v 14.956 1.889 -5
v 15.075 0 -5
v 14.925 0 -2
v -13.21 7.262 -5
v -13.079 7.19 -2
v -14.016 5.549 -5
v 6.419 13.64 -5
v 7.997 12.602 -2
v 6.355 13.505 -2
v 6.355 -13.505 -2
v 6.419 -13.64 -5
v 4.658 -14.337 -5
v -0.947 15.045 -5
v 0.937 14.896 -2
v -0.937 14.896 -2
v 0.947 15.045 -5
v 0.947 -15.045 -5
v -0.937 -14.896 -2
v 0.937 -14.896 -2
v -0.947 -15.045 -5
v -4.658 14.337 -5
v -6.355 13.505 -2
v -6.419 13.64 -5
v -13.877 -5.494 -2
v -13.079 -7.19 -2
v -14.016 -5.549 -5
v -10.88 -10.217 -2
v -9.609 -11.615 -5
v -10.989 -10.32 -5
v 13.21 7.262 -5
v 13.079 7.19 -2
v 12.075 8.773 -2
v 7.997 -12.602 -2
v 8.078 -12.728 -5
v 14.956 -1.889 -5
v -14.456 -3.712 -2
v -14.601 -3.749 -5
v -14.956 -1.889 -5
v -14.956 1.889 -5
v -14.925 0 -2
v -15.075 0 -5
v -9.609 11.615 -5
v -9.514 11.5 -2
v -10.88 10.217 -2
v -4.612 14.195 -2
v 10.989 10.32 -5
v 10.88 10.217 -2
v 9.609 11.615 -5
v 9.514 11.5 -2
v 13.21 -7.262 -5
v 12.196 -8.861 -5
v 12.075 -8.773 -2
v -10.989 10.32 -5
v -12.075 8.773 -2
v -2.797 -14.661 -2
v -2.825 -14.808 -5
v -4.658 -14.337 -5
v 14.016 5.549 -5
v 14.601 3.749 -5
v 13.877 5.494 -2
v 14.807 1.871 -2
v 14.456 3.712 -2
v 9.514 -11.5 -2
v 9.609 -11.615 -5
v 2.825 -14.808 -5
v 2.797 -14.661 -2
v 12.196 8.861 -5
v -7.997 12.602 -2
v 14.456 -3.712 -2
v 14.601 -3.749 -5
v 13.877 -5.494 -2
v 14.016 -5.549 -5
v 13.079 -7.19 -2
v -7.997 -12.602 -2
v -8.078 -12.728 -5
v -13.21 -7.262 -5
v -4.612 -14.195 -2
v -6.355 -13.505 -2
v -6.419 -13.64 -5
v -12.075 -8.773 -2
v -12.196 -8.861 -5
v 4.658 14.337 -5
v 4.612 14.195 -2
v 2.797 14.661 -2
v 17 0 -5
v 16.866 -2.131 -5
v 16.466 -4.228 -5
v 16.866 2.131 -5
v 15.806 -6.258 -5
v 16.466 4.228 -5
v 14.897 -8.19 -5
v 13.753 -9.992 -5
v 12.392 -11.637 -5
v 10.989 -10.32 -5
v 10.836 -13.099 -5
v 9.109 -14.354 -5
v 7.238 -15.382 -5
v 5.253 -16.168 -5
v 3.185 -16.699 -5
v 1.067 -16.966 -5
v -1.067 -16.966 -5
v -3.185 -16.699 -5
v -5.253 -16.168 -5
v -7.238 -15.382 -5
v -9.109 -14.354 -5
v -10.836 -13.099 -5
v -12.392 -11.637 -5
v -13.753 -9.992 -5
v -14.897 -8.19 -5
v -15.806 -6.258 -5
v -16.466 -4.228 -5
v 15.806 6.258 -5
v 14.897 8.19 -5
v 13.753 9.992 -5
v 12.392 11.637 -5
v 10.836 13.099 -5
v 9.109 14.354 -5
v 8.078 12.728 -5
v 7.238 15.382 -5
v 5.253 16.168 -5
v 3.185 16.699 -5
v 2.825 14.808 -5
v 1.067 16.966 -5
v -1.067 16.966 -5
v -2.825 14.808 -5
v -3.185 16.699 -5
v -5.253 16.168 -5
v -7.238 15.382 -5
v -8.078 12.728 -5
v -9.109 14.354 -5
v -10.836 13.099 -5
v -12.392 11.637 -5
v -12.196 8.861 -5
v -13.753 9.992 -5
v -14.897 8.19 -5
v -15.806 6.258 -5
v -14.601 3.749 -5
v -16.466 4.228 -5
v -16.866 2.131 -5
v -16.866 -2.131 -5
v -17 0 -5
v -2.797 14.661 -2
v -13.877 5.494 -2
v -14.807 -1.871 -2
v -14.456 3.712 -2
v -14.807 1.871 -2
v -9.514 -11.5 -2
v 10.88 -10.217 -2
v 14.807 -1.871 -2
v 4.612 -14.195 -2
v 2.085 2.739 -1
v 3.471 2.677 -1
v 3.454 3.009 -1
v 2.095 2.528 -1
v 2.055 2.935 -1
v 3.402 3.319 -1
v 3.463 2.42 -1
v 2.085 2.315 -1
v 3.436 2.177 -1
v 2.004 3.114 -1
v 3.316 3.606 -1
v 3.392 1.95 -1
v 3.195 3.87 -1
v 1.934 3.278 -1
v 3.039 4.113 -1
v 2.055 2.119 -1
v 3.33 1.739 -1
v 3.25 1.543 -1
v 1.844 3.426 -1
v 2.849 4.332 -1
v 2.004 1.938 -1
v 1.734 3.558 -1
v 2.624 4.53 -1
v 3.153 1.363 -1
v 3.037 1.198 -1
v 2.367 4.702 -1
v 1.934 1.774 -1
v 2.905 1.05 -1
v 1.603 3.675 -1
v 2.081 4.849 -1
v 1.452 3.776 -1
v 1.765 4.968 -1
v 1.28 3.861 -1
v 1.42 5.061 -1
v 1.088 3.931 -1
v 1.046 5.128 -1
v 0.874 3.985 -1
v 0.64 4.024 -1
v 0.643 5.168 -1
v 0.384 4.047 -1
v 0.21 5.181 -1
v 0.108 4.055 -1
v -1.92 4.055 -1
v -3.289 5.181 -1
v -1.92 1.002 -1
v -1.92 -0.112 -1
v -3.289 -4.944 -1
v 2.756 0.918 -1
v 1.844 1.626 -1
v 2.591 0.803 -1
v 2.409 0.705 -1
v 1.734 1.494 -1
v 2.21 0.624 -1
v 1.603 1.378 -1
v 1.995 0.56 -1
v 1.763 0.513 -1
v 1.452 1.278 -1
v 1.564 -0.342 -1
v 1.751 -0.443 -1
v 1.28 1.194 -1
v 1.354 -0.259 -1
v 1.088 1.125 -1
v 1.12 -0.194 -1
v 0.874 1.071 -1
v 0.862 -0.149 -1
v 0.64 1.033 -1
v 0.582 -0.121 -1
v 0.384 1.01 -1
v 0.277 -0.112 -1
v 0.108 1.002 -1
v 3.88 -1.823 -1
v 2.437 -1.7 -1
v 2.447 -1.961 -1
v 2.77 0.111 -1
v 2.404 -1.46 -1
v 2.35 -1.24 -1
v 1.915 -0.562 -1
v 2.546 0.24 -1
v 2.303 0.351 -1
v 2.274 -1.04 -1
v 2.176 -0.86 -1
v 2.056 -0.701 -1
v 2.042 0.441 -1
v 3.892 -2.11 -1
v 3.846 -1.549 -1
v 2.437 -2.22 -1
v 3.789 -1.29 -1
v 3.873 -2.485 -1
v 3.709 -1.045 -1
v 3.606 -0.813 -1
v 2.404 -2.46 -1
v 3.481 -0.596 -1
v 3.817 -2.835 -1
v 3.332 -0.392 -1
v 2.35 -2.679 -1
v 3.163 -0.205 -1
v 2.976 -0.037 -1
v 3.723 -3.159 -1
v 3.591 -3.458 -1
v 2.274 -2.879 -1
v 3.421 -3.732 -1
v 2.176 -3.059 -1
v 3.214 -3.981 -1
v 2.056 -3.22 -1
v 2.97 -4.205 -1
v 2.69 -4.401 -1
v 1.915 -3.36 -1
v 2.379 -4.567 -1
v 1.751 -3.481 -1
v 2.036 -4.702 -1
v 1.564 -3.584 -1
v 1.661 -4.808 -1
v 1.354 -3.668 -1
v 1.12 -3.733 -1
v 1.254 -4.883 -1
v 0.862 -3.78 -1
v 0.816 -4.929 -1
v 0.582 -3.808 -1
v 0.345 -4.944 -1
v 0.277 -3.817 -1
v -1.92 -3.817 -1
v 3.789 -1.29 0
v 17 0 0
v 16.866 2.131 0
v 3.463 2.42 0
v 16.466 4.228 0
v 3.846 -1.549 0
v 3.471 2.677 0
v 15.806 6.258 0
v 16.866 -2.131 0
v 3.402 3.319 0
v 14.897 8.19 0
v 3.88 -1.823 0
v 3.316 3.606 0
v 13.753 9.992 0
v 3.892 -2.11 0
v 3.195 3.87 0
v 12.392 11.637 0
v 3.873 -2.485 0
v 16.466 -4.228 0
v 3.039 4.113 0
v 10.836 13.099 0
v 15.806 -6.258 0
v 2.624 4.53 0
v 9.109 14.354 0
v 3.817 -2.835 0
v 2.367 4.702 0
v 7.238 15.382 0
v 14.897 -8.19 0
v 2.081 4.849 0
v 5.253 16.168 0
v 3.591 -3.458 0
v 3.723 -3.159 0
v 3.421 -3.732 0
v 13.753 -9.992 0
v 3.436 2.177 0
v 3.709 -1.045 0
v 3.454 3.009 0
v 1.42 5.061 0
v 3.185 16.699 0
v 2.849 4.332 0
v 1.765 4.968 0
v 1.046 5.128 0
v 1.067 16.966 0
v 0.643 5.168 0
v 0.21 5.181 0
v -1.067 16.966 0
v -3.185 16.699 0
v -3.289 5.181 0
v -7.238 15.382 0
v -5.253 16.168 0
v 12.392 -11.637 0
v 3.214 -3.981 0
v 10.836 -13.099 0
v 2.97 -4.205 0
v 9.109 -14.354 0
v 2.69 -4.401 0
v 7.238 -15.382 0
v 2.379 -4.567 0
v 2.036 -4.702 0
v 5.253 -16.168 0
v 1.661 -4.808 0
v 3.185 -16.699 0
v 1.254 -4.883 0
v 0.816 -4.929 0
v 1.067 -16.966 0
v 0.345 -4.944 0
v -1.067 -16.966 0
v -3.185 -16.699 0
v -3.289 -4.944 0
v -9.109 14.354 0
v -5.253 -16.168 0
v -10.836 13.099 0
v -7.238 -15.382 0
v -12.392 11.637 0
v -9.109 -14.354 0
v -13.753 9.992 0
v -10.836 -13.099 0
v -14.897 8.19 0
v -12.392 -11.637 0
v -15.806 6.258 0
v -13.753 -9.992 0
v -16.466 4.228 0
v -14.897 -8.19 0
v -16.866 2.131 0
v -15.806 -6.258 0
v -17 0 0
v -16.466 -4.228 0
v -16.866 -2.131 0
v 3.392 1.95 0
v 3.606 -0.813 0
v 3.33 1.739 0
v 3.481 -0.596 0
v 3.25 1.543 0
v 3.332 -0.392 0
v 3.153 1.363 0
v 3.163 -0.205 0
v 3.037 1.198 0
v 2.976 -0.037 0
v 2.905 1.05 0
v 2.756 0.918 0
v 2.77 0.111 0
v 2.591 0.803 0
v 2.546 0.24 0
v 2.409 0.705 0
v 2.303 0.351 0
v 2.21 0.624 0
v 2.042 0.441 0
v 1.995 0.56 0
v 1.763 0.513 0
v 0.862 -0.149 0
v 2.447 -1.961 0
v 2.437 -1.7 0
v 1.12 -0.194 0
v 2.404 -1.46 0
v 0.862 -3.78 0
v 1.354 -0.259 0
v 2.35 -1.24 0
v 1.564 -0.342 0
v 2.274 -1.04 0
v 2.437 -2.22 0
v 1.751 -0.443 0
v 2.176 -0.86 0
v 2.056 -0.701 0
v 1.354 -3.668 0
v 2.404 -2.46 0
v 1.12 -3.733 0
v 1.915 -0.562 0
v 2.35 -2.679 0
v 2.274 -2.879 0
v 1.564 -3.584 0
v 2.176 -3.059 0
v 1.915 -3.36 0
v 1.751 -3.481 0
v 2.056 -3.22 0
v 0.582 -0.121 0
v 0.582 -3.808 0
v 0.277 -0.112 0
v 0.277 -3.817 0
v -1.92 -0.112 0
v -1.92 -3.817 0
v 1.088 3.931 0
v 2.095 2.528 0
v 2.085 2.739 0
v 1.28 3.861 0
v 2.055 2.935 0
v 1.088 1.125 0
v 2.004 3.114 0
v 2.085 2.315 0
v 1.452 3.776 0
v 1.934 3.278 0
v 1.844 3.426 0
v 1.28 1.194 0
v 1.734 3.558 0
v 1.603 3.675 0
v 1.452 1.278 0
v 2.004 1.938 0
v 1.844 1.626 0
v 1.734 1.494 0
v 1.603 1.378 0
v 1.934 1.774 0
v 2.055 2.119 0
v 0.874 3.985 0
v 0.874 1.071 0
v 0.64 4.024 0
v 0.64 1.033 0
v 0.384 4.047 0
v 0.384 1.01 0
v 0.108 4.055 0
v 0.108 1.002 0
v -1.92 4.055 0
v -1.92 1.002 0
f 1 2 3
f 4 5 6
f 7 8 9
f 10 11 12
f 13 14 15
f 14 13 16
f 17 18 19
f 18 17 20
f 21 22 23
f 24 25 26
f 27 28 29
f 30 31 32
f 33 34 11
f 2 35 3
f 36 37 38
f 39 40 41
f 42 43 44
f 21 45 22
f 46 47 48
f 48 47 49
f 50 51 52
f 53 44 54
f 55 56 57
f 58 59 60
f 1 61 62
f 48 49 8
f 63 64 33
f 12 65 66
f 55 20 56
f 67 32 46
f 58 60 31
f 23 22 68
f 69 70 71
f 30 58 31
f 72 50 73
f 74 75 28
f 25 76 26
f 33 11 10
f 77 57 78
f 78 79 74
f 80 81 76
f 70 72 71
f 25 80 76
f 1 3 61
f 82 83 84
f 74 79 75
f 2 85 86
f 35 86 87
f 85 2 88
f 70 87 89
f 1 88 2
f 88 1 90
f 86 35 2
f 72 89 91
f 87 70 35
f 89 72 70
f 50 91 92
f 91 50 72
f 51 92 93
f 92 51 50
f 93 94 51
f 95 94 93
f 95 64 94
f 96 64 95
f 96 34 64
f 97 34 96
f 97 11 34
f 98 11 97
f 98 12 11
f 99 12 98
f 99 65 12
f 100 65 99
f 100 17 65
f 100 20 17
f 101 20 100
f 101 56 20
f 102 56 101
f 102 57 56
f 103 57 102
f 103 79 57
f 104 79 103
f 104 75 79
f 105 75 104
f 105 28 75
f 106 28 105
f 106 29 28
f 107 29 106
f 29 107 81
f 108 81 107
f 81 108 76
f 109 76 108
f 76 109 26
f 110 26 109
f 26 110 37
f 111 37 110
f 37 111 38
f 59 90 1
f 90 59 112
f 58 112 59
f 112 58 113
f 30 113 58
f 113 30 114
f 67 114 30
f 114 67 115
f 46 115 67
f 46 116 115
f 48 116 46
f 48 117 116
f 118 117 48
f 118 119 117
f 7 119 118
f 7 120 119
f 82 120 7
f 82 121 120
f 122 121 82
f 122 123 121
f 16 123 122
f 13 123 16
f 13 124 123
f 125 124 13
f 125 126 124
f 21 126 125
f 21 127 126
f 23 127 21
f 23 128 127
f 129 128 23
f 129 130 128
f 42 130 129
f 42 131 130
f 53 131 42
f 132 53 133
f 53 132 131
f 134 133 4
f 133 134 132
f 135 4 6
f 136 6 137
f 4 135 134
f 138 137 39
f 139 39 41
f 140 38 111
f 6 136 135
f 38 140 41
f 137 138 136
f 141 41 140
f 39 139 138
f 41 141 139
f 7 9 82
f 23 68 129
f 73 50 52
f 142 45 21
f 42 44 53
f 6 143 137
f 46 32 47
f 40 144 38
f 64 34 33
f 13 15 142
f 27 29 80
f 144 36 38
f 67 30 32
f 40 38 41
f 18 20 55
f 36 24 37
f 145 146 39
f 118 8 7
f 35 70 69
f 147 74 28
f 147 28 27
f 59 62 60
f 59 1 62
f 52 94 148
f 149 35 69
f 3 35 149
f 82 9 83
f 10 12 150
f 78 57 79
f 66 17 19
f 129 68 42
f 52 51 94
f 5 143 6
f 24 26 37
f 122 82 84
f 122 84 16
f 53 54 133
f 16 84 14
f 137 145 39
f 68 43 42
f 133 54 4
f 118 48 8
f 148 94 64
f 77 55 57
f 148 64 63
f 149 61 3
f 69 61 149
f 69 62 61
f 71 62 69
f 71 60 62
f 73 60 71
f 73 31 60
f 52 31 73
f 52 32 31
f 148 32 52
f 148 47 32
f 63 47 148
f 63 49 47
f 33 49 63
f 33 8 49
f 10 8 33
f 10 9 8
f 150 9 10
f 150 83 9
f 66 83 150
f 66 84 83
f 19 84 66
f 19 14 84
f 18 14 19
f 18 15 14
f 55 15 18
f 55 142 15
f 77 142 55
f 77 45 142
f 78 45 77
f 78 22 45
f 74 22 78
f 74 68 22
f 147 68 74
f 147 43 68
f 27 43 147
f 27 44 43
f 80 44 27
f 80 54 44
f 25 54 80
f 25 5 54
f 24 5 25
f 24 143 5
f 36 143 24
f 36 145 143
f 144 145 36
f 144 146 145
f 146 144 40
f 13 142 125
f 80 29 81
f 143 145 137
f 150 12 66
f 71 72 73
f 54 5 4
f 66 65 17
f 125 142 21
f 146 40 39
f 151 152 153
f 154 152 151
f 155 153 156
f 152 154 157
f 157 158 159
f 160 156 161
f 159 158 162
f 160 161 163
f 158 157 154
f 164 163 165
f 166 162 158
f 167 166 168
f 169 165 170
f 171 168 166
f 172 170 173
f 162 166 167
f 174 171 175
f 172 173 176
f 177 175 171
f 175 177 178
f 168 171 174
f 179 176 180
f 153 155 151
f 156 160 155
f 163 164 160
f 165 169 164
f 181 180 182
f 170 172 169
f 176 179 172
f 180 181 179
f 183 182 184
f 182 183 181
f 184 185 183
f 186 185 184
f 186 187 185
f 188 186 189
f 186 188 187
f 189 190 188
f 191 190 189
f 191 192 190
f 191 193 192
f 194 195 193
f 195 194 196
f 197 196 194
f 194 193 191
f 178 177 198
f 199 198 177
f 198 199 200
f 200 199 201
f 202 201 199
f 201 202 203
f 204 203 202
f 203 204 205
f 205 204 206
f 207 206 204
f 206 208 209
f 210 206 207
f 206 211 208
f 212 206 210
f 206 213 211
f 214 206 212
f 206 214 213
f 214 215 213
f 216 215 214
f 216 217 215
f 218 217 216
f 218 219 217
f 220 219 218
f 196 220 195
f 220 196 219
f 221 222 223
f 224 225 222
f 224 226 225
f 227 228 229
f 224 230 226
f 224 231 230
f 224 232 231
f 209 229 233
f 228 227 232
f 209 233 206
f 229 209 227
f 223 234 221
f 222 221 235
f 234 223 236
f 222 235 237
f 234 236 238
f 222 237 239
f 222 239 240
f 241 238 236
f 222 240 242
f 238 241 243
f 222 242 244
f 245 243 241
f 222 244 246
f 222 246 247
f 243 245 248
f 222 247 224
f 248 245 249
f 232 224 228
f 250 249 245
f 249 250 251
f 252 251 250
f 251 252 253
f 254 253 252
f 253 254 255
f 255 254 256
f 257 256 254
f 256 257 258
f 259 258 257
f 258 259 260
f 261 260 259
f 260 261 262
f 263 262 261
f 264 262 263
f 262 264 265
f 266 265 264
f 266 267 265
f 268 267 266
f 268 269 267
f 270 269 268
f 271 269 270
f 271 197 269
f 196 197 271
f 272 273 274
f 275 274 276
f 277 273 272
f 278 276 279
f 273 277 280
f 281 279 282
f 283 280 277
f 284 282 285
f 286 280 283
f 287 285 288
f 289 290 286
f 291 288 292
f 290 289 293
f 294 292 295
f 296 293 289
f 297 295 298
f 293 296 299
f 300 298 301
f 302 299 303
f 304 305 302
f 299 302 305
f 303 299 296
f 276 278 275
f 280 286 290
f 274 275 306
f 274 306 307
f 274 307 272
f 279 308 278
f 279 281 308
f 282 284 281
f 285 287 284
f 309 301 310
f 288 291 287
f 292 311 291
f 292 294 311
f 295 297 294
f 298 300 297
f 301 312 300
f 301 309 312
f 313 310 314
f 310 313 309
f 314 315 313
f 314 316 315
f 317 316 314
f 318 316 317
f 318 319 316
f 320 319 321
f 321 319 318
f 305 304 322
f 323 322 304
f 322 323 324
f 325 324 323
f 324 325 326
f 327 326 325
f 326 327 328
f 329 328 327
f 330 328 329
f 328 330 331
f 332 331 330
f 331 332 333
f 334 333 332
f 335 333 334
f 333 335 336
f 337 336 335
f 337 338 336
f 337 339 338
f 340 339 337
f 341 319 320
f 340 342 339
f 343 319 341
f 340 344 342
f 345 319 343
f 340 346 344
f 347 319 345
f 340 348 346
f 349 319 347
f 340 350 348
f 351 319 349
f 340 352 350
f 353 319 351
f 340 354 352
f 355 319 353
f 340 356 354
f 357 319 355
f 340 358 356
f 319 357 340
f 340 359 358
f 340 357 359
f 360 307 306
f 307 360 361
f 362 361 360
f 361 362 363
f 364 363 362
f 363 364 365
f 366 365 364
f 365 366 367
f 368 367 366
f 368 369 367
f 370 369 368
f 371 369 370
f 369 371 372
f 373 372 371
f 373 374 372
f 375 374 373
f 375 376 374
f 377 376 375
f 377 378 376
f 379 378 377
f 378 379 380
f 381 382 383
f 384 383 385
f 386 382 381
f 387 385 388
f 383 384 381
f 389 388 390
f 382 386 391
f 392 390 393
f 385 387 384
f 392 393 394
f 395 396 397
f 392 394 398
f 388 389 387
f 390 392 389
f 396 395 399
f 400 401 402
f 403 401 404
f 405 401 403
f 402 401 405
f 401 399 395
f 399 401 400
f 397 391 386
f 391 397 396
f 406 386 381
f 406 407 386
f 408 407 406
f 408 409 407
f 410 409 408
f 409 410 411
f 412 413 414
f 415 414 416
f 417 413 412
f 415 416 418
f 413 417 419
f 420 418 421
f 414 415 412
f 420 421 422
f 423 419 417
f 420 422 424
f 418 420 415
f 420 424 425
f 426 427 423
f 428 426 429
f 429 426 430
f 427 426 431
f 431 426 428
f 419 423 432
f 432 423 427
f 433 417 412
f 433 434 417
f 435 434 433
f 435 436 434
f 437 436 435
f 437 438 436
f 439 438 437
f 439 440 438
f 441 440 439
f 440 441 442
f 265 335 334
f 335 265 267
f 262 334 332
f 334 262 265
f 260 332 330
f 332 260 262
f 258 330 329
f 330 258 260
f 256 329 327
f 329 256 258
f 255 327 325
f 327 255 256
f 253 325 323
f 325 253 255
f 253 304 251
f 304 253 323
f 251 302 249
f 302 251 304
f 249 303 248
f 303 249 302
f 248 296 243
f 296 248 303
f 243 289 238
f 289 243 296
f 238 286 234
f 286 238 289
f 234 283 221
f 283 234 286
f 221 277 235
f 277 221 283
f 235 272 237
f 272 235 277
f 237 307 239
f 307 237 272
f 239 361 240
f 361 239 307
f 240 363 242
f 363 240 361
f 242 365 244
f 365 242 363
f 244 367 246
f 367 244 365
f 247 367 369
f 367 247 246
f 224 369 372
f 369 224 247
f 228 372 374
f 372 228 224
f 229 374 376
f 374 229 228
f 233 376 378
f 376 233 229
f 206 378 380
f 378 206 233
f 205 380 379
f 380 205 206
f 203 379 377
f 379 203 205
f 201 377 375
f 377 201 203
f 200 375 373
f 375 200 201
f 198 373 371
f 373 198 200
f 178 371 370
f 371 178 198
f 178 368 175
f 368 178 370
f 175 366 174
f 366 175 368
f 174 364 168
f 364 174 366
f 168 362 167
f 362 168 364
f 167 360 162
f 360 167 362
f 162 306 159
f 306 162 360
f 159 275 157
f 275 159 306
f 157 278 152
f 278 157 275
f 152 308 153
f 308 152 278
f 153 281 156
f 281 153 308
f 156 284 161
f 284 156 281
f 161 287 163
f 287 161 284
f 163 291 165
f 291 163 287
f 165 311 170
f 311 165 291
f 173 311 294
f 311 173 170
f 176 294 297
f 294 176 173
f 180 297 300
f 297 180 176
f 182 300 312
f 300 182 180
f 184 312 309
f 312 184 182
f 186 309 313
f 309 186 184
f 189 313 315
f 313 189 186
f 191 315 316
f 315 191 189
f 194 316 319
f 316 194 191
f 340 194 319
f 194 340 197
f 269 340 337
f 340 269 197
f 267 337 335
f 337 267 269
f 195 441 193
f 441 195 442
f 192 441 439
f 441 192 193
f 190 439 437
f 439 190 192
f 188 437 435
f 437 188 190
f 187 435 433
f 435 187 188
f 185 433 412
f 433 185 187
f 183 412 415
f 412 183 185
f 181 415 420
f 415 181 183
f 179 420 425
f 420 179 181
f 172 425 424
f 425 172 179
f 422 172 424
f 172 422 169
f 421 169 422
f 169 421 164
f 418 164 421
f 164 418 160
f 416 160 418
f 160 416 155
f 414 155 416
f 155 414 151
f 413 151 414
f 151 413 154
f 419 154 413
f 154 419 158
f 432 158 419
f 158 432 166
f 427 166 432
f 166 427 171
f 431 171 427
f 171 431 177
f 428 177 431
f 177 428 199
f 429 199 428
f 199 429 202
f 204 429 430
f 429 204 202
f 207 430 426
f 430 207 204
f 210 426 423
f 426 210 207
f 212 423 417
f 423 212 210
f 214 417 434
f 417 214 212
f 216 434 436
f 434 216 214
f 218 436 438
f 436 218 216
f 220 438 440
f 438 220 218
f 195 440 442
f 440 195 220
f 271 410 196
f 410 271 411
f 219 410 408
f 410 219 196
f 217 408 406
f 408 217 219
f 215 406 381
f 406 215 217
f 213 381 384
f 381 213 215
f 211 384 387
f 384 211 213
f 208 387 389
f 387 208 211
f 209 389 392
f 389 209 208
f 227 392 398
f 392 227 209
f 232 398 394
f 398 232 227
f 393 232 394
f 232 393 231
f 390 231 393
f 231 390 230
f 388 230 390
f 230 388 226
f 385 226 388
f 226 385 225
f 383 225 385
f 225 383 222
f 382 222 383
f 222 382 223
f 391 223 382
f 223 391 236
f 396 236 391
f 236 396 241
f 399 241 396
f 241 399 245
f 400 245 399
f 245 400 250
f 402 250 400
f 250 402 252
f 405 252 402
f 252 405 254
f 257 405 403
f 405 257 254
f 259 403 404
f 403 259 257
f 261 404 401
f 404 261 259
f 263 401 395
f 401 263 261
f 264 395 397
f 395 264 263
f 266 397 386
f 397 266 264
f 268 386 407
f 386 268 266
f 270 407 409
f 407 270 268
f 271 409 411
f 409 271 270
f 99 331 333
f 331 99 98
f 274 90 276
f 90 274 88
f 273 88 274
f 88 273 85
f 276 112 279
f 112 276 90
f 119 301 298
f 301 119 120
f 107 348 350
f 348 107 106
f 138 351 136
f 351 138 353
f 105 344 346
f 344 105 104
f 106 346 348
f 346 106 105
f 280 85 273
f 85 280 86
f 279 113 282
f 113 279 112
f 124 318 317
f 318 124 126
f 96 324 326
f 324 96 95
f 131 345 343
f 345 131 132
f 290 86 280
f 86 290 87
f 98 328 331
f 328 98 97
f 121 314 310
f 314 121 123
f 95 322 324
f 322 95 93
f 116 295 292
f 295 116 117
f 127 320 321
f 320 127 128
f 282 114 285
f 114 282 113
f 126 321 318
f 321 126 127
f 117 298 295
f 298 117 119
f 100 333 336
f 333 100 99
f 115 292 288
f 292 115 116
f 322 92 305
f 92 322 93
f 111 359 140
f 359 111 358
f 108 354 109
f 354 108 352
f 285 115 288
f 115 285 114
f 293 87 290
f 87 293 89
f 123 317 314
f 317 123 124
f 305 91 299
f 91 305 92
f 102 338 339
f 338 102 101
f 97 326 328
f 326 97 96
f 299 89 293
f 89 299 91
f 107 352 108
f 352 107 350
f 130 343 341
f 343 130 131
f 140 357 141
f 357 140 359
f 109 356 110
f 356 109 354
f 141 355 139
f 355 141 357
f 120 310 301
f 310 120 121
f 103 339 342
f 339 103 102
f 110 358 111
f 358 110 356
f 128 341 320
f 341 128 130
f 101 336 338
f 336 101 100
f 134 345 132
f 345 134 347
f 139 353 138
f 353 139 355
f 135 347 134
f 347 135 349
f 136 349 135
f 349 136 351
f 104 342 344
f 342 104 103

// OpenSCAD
$fn = 50;


difference() {
	union() {
		translate(v = [0, 0, -5.0000000000]) {
			cylinder(h = 5, r = 17.0000000000);
		}
	}
	union() {
		#translate(v = [0, 0, -5.0000000000]) {
			cylinder(h = 3, r1 = 15.0750000000, r2 = 14.9250000000);
		}
		translate(v = [0, 0, -1]) {
			linear_extrude(height = 1) {
				text(font = "Impact", halign = "center", size = 10, text = "B", valign = "center");
			}
		}
	}
}
